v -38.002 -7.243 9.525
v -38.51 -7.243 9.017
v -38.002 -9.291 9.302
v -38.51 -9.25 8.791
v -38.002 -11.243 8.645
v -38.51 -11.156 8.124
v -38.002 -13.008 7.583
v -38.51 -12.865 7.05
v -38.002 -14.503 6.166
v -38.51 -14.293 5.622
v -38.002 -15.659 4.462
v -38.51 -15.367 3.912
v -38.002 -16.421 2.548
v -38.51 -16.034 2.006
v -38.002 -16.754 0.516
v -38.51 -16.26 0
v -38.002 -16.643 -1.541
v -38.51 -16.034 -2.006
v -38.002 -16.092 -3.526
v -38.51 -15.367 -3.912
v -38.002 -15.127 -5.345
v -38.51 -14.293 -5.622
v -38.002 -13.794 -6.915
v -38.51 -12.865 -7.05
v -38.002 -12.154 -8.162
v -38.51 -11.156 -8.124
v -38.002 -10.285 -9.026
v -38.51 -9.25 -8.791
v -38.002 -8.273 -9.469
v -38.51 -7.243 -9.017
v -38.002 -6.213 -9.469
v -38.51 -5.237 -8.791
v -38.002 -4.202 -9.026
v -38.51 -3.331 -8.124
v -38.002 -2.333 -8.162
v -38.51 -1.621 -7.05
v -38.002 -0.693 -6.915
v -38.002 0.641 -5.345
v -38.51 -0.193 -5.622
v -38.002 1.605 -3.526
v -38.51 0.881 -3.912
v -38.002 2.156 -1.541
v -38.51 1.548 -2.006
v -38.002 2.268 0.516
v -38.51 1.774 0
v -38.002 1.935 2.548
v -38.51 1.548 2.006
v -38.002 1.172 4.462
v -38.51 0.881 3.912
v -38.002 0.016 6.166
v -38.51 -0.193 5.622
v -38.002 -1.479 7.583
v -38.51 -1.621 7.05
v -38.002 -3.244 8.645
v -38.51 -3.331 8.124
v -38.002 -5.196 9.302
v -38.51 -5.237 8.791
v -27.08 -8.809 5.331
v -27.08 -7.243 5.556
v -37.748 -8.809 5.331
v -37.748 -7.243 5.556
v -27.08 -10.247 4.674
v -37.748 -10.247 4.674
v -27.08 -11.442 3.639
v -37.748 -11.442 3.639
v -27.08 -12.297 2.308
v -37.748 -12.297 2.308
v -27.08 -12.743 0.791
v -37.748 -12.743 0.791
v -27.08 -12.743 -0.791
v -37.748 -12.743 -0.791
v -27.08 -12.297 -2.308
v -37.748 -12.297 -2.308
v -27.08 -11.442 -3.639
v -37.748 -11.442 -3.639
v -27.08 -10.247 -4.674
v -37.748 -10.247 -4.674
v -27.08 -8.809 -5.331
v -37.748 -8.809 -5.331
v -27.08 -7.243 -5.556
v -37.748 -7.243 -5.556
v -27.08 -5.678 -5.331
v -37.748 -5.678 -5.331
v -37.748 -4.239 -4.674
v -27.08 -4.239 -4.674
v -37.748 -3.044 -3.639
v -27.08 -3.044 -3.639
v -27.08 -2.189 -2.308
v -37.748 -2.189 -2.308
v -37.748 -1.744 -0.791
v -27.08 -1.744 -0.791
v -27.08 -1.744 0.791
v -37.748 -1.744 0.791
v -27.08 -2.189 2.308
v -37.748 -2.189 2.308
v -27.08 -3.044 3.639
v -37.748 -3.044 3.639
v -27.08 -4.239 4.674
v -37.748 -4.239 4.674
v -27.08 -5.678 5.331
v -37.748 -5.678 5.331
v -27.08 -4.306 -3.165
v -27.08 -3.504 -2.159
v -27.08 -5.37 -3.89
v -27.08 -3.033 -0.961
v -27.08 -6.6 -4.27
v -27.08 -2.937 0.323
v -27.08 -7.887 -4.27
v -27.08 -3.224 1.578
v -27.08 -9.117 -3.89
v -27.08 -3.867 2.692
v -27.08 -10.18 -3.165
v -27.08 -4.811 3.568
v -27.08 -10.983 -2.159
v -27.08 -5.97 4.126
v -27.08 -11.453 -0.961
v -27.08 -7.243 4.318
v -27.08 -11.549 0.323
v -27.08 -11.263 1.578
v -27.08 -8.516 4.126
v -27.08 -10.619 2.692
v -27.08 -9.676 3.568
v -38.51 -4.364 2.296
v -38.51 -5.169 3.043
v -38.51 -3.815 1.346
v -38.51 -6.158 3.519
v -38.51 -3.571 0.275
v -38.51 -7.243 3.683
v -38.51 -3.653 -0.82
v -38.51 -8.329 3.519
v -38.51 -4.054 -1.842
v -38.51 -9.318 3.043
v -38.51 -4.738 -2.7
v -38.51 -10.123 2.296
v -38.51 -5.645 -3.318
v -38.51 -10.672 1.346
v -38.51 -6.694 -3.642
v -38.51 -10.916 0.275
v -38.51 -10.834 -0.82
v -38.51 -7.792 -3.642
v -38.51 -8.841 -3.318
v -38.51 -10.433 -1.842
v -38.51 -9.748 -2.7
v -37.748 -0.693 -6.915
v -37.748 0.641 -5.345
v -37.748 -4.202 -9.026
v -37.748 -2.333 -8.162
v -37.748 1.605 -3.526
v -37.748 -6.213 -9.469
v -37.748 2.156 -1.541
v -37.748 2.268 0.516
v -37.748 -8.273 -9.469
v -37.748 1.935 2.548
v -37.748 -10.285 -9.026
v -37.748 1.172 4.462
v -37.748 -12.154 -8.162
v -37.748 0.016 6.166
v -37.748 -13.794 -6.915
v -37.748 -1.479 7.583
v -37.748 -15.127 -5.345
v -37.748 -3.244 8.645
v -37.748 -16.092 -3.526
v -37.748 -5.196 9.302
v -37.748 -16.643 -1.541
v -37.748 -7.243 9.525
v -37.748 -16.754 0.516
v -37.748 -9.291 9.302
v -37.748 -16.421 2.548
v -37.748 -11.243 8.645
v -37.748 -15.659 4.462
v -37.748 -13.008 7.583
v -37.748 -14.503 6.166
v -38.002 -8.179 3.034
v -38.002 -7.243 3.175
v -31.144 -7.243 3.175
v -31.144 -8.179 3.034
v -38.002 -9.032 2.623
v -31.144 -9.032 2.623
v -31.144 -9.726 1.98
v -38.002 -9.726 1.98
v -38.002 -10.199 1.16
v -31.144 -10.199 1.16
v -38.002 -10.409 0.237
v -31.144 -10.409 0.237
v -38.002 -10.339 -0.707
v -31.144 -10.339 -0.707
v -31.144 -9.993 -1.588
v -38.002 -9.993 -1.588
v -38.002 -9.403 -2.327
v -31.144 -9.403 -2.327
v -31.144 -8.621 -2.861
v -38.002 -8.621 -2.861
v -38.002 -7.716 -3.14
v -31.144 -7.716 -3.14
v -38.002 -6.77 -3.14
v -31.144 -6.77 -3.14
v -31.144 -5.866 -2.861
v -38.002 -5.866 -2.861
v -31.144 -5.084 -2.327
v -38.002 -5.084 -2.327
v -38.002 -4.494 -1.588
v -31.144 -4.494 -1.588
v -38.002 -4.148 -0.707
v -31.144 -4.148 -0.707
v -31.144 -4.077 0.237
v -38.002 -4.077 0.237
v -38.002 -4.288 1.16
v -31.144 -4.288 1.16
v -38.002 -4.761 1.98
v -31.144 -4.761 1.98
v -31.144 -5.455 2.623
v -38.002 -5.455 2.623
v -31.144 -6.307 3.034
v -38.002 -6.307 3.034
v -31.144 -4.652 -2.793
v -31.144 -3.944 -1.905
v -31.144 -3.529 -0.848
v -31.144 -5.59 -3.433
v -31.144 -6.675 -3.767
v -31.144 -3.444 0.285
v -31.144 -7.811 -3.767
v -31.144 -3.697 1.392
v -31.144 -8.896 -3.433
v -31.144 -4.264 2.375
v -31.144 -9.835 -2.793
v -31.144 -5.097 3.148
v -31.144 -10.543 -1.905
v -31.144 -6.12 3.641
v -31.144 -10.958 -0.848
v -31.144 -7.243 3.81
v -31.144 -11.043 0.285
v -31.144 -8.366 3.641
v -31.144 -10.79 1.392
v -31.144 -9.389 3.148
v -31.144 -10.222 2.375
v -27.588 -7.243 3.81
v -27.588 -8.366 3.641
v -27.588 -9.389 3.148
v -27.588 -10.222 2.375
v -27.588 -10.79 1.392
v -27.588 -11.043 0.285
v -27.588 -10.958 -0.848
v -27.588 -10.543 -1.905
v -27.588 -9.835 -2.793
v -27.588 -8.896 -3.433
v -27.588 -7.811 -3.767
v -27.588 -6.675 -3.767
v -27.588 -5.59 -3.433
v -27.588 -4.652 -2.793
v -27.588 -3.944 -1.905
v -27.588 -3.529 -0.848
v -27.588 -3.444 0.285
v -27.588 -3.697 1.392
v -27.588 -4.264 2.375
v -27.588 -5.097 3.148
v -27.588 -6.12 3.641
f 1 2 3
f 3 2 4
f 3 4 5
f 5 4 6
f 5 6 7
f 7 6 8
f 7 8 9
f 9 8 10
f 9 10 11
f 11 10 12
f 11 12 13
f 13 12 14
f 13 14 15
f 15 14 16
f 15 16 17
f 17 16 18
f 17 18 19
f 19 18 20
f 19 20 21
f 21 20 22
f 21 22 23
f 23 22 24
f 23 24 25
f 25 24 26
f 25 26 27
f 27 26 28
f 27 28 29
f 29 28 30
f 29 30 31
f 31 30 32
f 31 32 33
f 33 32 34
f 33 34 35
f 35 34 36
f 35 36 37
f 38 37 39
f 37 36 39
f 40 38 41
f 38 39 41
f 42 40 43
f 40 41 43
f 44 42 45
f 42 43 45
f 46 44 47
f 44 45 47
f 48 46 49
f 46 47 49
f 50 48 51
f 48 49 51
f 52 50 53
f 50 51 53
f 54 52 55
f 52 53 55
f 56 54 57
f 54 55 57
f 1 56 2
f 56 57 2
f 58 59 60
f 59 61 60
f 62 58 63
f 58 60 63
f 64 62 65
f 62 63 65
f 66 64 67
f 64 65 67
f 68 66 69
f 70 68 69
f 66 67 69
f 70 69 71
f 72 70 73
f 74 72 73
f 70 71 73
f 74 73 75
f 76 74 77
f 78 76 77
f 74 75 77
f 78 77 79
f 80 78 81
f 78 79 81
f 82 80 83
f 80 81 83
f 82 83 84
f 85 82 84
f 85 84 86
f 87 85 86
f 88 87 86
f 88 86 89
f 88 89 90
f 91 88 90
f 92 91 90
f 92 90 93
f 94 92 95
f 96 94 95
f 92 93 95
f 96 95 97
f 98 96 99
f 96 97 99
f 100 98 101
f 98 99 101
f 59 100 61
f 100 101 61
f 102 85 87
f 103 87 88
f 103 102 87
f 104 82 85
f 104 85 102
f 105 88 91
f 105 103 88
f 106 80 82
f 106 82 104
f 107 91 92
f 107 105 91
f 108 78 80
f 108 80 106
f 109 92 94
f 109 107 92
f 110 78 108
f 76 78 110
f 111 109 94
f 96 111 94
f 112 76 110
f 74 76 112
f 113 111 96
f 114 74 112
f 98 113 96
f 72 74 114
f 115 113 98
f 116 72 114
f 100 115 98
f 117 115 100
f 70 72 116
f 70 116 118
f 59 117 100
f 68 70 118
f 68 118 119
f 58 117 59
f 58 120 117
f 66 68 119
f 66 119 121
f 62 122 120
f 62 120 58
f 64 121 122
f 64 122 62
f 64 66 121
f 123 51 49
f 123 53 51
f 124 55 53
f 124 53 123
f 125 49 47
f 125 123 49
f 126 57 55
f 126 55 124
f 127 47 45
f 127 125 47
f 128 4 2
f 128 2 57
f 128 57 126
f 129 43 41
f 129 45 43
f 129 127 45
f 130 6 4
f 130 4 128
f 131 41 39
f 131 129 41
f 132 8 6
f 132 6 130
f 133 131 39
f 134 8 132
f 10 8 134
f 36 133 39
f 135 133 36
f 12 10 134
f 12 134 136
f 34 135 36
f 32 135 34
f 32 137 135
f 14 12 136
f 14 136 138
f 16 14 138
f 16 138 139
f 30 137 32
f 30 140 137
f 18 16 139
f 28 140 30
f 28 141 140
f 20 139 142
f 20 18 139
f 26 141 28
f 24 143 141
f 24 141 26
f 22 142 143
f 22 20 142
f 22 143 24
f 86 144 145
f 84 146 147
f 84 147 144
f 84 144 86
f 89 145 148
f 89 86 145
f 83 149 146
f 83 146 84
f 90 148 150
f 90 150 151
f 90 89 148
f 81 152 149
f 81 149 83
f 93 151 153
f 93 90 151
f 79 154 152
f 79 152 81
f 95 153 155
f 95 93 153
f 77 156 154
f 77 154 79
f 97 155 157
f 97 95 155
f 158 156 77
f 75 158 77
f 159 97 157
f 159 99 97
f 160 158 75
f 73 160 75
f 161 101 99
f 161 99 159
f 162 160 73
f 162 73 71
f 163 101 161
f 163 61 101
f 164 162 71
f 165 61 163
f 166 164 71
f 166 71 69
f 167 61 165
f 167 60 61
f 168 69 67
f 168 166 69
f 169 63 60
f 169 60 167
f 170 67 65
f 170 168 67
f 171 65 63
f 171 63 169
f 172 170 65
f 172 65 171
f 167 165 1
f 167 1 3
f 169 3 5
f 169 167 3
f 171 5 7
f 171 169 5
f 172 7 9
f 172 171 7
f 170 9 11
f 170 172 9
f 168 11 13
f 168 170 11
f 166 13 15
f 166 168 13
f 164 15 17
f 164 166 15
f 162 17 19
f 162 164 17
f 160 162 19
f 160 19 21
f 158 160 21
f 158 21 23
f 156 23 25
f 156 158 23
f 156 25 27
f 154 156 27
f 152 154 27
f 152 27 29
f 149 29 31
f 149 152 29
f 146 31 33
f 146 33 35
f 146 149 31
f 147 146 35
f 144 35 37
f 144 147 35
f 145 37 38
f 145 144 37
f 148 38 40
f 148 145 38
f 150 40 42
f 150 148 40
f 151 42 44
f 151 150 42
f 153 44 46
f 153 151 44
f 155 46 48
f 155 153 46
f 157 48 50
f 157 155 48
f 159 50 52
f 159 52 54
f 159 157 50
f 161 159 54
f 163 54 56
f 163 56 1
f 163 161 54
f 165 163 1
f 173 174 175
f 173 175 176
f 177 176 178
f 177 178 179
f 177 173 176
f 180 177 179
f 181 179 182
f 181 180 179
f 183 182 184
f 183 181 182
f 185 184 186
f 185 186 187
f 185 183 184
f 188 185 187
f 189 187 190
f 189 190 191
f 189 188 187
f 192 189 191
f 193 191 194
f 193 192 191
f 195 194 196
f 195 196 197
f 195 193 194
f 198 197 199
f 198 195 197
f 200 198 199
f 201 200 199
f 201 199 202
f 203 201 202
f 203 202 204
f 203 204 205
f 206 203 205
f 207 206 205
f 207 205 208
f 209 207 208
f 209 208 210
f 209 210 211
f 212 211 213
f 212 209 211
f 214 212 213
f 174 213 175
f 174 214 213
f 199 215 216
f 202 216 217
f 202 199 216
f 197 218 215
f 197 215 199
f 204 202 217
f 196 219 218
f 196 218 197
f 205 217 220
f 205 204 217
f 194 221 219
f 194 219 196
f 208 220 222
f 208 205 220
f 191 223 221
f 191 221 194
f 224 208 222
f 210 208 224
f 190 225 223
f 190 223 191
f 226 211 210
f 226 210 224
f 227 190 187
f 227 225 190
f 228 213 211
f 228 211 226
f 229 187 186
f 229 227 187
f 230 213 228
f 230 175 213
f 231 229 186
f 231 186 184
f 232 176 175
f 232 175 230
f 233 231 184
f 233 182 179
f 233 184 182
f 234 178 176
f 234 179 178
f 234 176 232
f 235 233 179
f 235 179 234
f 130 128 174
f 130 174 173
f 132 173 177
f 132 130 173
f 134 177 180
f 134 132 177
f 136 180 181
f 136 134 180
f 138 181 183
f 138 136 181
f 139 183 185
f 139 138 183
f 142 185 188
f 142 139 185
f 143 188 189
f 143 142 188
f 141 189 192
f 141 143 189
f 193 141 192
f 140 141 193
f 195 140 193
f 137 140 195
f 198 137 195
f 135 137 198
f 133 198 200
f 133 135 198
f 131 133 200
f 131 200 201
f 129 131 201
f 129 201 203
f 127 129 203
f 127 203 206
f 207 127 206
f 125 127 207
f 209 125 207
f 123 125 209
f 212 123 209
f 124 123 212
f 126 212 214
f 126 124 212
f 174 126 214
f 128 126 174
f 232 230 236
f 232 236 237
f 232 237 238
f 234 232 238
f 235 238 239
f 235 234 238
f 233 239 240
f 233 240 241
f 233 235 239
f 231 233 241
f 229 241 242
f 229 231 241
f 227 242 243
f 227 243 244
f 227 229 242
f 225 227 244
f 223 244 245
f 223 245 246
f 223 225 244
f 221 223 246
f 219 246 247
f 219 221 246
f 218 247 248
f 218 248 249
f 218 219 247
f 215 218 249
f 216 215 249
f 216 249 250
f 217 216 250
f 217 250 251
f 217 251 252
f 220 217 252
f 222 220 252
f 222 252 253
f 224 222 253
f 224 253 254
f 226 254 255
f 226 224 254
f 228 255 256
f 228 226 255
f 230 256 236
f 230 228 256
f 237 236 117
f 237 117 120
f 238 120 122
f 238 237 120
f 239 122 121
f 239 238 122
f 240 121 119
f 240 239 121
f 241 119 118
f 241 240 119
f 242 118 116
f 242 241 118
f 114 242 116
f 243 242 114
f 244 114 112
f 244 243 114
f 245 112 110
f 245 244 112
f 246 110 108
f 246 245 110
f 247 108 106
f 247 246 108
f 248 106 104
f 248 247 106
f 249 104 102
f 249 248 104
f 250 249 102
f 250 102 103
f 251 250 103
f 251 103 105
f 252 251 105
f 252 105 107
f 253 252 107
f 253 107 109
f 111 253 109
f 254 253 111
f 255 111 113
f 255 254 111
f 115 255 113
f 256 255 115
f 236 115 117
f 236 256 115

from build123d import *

# Parameters (mm, degrees)
CHAMFER1_SIZE = 0.508


with BuildPart() as part:
    # Sketch1 → Revolve1 (revolve)
    with BuildSketch(Plane.XY, mode=Mode.PRIVATE) as revolve1_sk:
        Polygon((-38.510306737, 2.281775494), (-37.748306737, 2.281775494), (-37.748306737, -1.686974506), (-33.430306737, -1.686974506), (-27.080306737, -1.686974506), (-27.080306737, -3.433224506), (-31.144306737, -3.433224506), (-31.144306737, -4.068224506), (-38.510306737, -4.068224506), align=None)
    revolve(revolve1_sk.sketch.rotate(Axis((-27.588306737, -7.243224506, 0), (1, 0, 0)), 90), axis=Axis((-27.588306737, -7.243224506, 0), (1, 0, 0)))

    # Chamfer1
    chamfer1_edges = [part.edges().sort_by_distance(p)[0] for p in [
        (-38.510306737, -7.243224506, -3.175),
        (-38.510306737, -7.243224506, -9.525),
        (-27.080306737, -7.243224506, -3.81),
    ]]
    chamfer(chamfer1_edges, length=CHAMFER1_SIZE)


solid = part.part
